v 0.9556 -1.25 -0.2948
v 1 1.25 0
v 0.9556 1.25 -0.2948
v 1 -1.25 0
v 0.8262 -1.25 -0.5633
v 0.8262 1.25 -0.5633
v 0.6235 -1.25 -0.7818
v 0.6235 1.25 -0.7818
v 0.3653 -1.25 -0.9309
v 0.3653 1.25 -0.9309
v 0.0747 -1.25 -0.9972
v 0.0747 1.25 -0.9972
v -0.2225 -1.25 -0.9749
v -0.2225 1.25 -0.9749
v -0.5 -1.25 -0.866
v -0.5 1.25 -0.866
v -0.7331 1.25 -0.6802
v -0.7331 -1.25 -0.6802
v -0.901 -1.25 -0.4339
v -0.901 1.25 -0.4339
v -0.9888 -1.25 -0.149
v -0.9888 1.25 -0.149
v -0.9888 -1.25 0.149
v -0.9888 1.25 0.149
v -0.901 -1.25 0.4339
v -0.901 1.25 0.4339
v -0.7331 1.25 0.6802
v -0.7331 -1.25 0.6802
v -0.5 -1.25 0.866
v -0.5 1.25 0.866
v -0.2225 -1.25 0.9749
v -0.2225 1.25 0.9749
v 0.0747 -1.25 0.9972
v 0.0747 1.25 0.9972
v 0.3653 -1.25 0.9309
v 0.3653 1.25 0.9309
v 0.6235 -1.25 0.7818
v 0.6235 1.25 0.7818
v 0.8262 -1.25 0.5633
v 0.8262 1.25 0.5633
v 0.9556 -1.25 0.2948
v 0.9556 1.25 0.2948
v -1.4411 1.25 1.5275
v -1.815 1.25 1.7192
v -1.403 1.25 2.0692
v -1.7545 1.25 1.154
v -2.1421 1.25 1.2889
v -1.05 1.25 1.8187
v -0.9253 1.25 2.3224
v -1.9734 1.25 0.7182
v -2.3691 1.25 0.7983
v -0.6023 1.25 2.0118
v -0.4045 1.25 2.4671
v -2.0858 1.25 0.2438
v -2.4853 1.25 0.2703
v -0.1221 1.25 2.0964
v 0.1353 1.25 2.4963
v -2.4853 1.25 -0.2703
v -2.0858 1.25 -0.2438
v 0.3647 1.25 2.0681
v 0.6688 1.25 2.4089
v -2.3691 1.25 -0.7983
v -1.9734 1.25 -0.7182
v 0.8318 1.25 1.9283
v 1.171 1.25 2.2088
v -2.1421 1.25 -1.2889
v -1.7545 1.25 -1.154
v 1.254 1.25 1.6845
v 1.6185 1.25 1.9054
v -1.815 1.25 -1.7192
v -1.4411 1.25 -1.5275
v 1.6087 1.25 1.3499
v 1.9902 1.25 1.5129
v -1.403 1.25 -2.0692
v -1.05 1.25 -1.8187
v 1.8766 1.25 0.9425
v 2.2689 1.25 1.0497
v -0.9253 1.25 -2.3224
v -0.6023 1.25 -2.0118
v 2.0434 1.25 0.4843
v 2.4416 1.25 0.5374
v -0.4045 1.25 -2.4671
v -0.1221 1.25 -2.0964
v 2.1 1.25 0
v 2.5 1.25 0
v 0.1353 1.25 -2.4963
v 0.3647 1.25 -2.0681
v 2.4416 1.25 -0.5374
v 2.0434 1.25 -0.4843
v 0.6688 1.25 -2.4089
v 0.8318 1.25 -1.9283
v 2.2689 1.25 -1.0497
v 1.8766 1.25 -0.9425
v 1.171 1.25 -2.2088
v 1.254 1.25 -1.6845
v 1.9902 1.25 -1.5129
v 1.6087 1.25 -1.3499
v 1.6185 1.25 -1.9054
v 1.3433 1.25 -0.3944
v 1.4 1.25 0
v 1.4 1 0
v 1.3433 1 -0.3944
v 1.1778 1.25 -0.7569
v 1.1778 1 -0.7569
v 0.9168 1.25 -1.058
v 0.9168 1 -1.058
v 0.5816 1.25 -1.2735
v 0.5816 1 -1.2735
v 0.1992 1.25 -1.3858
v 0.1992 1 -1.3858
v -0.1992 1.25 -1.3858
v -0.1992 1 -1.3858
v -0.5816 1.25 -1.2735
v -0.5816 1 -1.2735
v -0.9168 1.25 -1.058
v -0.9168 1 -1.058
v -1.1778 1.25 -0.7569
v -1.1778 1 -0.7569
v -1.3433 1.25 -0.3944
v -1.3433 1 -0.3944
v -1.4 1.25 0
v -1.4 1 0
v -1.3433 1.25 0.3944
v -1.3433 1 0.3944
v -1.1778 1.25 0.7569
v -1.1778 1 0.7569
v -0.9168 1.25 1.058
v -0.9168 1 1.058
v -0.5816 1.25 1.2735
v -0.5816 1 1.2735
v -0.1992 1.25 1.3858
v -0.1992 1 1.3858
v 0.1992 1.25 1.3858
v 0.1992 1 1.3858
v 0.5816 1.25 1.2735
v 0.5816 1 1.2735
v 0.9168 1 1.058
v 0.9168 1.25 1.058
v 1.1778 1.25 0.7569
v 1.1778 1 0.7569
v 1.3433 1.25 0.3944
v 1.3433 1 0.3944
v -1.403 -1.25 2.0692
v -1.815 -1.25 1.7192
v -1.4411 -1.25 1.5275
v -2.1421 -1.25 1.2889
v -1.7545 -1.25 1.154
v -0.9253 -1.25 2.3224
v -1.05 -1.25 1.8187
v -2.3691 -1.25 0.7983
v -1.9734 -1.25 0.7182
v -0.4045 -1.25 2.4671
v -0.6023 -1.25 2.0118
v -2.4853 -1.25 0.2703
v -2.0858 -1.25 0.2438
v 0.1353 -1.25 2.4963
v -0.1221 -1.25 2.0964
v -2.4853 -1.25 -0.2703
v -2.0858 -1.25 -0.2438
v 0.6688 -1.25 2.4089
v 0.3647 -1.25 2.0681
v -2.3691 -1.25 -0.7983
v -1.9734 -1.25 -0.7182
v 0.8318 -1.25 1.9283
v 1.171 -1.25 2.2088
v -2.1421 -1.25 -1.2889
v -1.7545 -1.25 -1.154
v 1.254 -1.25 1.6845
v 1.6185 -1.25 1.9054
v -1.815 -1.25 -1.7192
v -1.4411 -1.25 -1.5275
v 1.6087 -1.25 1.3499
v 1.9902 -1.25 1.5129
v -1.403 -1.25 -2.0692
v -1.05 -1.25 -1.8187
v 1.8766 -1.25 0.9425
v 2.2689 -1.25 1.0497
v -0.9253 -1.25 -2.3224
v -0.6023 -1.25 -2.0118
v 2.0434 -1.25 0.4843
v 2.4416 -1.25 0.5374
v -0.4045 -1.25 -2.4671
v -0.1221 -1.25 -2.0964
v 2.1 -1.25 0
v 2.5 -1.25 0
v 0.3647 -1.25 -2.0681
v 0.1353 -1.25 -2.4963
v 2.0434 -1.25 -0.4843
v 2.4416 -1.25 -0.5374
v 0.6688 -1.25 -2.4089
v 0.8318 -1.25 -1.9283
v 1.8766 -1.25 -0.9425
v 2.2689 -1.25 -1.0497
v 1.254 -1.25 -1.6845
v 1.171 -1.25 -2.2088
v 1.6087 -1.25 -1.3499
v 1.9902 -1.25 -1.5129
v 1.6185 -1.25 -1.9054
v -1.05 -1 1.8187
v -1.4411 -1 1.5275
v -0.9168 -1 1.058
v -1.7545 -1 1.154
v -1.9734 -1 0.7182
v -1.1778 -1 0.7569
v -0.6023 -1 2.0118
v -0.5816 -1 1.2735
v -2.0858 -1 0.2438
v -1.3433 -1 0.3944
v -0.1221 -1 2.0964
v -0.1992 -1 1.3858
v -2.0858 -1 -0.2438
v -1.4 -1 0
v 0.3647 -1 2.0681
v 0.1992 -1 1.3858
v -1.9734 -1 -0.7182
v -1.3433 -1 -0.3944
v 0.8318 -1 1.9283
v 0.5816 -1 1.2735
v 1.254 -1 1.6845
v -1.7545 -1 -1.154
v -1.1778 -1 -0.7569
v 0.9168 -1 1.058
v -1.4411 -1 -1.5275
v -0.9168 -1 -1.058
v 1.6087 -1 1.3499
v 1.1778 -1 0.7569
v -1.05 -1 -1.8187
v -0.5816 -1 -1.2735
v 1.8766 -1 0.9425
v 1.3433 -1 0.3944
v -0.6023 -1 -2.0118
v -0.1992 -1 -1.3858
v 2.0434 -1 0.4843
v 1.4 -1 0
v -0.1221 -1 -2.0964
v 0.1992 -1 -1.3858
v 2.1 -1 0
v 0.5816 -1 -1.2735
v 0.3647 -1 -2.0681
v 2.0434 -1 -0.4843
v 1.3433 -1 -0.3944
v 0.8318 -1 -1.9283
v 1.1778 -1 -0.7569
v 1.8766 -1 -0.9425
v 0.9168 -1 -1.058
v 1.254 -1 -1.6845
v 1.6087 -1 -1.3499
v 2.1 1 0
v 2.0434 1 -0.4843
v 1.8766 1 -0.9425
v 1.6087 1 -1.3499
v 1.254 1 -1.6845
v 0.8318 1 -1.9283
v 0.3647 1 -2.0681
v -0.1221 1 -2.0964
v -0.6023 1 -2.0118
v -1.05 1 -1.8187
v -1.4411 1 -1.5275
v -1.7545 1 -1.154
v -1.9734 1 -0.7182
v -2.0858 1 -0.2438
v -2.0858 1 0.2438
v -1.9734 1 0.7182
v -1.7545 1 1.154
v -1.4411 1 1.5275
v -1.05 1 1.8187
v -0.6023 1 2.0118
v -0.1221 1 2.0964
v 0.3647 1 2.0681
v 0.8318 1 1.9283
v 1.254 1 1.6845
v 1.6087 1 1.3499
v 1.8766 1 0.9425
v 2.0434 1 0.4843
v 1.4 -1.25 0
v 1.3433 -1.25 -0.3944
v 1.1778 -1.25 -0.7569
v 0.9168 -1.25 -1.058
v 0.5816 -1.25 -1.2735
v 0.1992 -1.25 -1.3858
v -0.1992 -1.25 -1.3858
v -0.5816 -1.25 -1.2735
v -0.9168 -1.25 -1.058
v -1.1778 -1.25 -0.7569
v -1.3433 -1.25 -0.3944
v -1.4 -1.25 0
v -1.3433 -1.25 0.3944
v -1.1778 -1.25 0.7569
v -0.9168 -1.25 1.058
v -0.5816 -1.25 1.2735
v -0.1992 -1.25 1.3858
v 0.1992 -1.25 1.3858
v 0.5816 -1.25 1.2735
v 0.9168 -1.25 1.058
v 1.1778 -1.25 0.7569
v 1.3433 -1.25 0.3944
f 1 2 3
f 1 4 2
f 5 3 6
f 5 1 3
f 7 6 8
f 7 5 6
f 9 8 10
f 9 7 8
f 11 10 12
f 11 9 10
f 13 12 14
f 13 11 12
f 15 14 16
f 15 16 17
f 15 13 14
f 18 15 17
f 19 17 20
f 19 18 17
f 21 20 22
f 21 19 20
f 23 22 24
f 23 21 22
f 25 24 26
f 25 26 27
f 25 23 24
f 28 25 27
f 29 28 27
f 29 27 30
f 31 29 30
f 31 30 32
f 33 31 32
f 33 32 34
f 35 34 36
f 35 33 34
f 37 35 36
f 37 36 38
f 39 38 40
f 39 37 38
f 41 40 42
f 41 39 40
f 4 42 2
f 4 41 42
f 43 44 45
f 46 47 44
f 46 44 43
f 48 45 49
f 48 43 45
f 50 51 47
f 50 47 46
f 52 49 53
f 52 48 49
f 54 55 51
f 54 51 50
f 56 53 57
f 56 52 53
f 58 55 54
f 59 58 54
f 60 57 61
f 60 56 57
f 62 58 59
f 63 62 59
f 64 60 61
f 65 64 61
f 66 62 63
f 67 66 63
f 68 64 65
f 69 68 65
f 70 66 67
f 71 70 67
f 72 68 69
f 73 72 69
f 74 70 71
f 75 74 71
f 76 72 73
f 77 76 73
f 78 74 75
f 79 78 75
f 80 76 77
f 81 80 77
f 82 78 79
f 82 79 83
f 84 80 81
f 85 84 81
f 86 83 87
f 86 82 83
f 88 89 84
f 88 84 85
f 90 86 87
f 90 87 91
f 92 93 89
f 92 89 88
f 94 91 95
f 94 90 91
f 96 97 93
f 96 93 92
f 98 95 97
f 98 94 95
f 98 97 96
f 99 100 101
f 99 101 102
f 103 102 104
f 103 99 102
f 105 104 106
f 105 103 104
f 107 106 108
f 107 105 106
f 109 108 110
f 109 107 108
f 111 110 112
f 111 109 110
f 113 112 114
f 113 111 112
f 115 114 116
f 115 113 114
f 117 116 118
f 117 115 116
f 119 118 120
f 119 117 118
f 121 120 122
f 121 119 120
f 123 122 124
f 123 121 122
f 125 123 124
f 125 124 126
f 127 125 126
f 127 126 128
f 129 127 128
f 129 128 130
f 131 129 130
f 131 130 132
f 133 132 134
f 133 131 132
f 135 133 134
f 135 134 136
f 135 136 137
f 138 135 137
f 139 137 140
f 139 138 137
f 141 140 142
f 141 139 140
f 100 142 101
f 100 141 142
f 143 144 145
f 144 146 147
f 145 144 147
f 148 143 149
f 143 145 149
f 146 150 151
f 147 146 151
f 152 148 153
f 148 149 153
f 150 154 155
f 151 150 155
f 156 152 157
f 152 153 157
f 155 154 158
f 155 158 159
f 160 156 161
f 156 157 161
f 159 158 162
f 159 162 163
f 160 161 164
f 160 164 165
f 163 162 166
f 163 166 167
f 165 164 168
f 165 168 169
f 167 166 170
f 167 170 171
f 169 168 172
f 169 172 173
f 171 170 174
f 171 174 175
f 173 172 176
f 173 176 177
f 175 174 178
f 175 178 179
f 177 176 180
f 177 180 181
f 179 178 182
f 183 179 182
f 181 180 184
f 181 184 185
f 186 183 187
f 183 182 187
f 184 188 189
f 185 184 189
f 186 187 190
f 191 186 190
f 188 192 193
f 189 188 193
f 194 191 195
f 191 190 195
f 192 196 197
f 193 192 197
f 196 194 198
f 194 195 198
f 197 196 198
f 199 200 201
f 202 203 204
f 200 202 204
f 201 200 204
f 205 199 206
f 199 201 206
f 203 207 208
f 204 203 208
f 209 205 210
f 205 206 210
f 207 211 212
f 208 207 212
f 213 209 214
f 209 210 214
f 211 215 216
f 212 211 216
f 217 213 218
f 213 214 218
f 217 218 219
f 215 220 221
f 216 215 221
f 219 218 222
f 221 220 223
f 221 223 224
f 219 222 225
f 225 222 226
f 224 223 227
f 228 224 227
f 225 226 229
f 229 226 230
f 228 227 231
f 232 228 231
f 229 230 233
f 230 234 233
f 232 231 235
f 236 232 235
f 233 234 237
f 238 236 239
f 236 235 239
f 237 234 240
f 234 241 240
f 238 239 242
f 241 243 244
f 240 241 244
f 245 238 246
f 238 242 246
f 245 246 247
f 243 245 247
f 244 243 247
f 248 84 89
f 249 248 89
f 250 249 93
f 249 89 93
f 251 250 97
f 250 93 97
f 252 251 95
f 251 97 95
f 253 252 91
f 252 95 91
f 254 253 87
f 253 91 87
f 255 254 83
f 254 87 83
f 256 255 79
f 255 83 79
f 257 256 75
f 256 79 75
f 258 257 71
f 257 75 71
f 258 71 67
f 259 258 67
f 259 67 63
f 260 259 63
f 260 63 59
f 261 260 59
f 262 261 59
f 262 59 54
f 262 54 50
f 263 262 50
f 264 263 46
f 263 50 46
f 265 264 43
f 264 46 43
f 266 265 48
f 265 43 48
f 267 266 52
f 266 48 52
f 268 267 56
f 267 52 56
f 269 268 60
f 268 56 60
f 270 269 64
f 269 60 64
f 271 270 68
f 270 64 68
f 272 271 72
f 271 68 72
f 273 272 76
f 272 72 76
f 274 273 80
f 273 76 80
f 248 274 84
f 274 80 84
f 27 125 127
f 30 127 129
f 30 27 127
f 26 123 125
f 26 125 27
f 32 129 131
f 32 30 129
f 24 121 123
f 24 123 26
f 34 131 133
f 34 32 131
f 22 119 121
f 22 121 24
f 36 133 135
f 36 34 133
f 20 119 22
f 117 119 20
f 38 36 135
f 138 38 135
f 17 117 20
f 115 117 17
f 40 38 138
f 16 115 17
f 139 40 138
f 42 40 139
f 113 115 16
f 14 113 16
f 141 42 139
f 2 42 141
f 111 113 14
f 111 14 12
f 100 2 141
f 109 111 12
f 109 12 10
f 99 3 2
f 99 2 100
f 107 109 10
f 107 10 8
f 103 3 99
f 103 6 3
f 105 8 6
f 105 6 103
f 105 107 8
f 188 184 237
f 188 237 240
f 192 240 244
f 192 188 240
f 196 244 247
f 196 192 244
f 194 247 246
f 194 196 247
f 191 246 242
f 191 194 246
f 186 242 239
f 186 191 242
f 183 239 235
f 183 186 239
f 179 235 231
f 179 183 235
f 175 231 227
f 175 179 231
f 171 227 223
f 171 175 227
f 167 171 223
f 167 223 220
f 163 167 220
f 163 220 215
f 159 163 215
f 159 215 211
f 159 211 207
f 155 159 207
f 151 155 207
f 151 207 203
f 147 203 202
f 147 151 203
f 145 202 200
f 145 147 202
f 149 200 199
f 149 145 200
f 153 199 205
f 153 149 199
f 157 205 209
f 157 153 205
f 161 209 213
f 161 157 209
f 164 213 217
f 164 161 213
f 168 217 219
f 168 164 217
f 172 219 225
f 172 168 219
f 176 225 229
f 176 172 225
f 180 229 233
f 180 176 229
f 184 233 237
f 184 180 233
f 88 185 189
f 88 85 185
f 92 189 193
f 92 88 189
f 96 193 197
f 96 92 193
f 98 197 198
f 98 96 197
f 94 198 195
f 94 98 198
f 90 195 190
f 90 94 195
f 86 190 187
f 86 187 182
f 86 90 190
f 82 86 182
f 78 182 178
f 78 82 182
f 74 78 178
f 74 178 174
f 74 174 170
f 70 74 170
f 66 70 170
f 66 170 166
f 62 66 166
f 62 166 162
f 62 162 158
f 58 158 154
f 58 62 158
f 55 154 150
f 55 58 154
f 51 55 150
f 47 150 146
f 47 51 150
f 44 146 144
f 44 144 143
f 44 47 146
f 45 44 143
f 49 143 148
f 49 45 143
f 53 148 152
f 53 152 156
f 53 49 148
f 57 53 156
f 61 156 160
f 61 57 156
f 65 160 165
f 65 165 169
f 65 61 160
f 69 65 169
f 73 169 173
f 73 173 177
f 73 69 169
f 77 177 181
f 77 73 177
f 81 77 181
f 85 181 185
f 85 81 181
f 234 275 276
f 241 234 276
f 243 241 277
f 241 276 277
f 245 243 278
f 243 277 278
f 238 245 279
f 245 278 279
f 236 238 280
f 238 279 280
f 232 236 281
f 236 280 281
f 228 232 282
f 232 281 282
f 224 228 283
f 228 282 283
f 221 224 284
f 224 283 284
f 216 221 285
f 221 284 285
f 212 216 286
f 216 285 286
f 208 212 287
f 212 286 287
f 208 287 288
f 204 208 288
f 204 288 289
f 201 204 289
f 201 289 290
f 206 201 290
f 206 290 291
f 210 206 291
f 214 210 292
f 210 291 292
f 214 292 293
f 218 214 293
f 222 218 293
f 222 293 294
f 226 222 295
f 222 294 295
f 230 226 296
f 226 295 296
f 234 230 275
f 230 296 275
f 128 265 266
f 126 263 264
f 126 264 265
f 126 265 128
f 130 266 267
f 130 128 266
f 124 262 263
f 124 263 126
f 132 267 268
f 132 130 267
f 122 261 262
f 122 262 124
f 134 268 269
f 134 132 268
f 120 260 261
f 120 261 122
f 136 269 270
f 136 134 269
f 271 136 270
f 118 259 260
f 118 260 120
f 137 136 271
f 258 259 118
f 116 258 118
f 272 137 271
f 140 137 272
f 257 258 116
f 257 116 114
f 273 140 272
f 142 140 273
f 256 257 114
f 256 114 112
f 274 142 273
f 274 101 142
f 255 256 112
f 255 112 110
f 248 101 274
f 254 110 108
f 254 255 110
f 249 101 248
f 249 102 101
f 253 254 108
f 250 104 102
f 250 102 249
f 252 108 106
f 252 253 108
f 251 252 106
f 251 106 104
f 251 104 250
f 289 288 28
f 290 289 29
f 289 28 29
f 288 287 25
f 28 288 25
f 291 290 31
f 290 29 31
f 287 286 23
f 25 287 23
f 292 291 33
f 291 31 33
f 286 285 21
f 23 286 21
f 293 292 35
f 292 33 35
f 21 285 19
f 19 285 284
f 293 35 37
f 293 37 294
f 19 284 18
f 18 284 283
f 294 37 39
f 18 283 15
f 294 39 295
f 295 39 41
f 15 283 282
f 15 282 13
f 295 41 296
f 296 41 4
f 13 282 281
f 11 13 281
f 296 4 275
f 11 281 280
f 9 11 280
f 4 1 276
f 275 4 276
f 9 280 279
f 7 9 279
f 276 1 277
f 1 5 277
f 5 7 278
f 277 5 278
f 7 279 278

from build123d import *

# Parameters (mm, degrees)
SKETCH1_R           = 2.5
SKETCH1_R_2         = 1
BOSS_EXTRUDE1_DEPTH = 1.25
SKETCH2_R           = 2.1
SKETCH2_R_2         = 1.4
CUT_EXTRUDE1_DEPTH  = 0.25


with BuildPart() as part:
    # Sketch1 → Boss-Extrude1 (new body, symmetric)
    with BuildSketch(Plane(origin=(0, 0, 0), x_dir=(1, 0, 0), z_dir=(0, 1, 0))):
        Circle(SKETCH1_R)
        Circle(SKETCH1_R_2, mode=Mode.SUBTRACT)
    extrude(amount=BOSS_EXTRUDE1_DEPTH, both=True)

    # Sketch2 → Cut-Extrude1 (cut)
    with BuildSketch(Plane(origin=(0, 1.25, 0), x_dir=(1, 0, 0), z_dir=(0, 1, 0))):
        Circle(SKETCH2_R)
        Circle(SKETCH2_R_2, mode=Mode.SUBTRACT)
    cut_extrude1 = extrude(amount=-CUT_EXTRUDE1_DEPTH, mode=Mode.SUBTRACT)

    # Mirror1: Cut-Extrude1 across plane
    add(cut_extrude1.mirror(Plane.ZX), mode=Mode.SUBTRACT)


solid = part.part
